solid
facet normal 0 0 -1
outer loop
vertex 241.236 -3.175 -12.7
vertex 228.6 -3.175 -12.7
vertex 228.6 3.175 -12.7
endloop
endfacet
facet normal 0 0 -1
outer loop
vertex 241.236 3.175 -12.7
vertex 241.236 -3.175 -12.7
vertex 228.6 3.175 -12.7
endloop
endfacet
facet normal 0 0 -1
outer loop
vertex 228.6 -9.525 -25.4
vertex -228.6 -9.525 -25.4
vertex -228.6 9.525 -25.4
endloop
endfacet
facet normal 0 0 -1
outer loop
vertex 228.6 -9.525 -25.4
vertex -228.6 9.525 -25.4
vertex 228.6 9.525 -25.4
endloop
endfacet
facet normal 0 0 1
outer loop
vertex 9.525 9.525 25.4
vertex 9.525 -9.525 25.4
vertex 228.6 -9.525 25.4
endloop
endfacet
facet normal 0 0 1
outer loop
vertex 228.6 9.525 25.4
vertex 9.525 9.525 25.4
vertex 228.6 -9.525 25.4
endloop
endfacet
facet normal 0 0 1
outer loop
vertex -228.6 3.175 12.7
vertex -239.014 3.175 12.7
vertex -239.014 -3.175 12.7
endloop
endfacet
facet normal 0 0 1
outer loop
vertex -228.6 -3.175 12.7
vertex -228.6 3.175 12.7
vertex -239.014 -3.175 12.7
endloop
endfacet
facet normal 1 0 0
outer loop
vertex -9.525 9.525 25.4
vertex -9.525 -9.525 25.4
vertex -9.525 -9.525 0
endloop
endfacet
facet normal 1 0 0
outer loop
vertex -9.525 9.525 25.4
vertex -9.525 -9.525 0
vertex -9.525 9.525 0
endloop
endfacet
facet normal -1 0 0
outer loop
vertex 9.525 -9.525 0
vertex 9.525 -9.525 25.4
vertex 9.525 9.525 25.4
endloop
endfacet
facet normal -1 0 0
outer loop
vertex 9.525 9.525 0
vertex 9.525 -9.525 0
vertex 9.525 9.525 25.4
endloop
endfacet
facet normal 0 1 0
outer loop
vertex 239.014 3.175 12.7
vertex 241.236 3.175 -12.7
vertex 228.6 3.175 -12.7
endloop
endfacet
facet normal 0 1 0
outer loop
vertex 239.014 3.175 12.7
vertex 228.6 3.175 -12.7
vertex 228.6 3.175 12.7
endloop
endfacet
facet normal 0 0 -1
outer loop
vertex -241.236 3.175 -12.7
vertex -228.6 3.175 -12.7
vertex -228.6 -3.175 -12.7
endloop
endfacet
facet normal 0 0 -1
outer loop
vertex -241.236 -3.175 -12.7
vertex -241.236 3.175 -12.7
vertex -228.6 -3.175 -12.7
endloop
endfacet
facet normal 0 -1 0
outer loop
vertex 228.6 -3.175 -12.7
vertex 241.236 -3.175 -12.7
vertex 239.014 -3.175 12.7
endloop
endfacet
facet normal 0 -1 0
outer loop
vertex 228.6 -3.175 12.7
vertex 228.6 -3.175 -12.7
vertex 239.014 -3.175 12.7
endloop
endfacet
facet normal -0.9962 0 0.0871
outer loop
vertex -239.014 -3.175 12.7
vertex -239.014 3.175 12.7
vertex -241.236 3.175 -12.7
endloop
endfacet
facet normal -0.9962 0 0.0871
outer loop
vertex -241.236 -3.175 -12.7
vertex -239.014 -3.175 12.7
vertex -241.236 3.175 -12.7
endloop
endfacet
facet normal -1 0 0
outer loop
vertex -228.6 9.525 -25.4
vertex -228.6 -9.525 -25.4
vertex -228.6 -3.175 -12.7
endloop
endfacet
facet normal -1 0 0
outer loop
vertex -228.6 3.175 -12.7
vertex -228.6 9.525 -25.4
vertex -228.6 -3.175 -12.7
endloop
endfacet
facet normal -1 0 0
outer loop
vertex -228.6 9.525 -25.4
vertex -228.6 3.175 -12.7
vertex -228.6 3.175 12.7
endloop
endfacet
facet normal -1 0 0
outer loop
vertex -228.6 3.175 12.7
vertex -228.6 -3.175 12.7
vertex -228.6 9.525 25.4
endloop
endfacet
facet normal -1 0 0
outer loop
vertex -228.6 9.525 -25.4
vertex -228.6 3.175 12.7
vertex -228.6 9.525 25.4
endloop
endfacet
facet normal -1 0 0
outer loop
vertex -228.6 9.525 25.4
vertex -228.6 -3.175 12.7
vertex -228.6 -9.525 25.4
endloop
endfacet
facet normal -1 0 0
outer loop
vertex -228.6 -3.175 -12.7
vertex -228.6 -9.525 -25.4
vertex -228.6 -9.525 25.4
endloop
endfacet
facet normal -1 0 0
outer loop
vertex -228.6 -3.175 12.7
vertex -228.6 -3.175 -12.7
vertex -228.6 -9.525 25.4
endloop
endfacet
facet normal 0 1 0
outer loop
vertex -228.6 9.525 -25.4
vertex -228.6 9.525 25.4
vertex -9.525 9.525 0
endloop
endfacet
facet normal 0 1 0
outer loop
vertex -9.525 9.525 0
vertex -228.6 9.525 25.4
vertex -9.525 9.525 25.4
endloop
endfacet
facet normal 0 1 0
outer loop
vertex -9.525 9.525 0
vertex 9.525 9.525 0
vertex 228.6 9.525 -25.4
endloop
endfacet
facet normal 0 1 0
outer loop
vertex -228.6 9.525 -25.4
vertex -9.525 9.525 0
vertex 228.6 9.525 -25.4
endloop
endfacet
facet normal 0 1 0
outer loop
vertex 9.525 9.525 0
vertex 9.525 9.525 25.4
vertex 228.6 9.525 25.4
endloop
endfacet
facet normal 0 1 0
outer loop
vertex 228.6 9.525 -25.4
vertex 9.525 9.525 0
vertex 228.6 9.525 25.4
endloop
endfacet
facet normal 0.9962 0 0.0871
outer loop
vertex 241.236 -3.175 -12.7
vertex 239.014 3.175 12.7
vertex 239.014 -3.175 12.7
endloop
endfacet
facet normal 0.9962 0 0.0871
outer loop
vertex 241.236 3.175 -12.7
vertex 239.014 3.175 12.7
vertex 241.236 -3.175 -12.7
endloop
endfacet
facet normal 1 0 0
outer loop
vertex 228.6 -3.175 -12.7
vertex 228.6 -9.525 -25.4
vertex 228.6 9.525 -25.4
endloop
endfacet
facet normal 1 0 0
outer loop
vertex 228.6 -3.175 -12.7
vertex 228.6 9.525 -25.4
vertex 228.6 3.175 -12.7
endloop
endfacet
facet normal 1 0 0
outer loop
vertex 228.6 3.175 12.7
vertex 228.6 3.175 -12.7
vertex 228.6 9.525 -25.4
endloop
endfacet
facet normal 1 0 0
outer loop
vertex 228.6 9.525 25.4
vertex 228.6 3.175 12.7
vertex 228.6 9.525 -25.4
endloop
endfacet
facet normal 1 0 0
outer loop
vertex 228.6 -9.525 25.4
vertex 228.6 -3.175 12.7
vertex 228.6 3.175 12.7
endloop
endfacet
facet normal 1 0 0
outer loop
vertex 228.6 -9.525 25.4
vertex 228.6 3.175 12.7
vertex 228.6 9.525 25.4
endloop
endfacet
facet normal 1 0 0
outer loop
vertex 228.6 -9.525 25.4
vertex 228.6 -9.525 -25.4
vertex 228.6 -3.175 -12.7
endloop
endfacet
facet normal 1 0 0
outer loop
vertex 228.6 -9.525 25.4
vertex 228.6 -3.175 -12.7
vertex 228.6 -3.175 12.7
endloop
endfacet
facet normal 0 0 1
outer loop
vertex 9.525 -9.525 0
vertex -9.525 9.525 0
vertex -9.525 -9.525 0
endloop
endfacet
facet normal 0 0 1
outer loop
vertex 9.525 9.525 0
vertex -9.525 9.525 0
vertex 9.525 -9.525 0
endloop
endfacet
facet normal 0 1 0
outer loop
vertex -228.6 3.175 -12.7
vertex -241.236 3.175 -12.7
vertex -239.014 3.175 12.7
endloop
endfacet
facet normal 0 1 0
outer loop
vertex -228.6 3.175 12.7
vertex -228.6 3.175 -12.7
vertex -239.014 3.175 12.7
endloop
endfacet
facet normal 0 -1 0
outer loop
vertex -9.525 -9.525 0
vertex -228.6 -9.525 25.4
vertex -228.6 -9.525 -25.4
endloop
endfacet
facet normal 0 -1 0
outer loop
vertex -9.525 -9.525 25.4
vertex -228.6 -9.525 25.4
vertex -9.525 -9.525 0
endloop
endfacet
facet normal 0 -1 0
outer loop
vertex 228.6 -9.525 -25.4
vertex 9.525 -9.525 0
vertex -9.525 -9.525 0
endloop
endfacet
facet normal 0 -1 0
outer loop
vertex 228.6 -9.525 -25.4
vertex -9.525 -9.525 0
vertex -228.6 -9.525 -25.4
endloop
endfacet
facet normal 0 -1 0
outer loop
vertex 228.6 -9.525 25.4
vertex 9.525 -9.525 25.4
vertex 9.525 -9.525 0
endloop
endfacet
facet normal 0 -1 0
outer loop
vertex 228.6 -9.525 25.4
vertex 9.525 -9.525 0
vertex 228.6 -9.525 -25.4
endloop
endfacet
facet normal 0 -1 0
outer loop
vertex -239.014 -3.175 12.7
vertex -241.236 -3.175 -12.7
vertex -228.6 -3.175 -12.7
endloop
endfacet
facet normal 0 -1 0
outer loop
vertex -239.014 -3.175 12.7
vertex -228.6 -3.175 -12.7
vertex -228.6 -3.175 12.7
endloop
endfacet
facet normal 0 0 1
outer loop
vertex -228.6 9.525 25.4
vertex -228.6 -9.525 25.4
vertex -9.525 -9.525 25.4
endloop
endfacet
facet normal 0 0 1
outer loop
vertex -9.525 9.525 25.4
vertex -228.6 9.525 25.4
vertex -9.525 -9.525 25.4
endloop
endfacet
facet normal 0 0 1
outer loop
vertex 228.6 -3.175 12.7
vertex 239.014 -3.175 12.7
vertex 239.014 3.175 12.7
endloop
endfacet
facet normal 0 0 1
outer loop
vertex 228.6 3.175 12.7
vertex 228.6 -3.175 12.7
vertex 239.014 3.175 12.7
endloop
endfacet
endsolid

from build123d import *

# Parameters (mm, degrees)
F0_W        = 457.2
F0_H        = 50.8
F1_DEPTH    = 9.525
F2_W        = 19.05
F2_H        = 19.05
F3_DEPTH    = 25.4
F4_W        = 6.35
F4_H        = 25.4
F5_DEPTH    = 12.7
F6_W        = 6.35
F6_H        = 25.4
F7_DEPTH    = 12.7
F8_T1_DEPTH = 142.2021954046


# Not quite as in the source:
# - a fillet or chamfer that OpenCascade refuses, or shapes differently, is made with other operations: its cross-section is extruded or revolved along the edge and cut away or added
# - a feature names something its author has since deleted; it is built from what else it names


with BuildPart() as f1:
    # F0 (on Front) → F1 (new body, symmetric)
    with BuildSketch(Plane.XZ):
        Rectangle(F0_W, F0_H)
    extrude(amount=F1_DEPTH, both=True)

    # F2 (on face) → F3 (cut, symmetric)
    with BuildSketch(Plane.XY.offset(25.4)):
        Rectangle(F2_W, F2_H)
    extrude(amount=F3_DEPTH, both=True, mode=Mode.SUBTRACT)

    # F4 (on face) → F5 (join, symmetric)
    with BuildSketch(Plane.YZ.offset(228.6)):
        Rectangle(F4_W, F4_H)
    extrude(amount=F5_DEPTH, both=True)

    # F6 (on face) → F7 (join, symmetric)
    with BuildSketch(Plane(origin=(-228.6, 0, 0), x_dir=(0, -1, 0), z_dir=(-1, 0, 0))):
        Rectangle(F6_W, F6_H)
    extrude(amount=F7_DEPTH, both=True)

    # F8: chamfer of 2.286 x 26.1290995641 on 2 edges, made by hand

    # F8_s2 → F8_t1 (cut)
    with BuildSketch(Plane.XZ.offset(-71.1010977023)):
        Polygon((-239.014, 12.7), (-241.3, -13.4290995641), (-241.3, 12.7), align=None)
        Polygon((239.014, 12.7), (241.3, -13.4290995641), (241.3, 12.7), align=None)
    extrude(amount=F8_T1_DEPTH, mode=Mode.SUBTRACT)


solid = f1.part
